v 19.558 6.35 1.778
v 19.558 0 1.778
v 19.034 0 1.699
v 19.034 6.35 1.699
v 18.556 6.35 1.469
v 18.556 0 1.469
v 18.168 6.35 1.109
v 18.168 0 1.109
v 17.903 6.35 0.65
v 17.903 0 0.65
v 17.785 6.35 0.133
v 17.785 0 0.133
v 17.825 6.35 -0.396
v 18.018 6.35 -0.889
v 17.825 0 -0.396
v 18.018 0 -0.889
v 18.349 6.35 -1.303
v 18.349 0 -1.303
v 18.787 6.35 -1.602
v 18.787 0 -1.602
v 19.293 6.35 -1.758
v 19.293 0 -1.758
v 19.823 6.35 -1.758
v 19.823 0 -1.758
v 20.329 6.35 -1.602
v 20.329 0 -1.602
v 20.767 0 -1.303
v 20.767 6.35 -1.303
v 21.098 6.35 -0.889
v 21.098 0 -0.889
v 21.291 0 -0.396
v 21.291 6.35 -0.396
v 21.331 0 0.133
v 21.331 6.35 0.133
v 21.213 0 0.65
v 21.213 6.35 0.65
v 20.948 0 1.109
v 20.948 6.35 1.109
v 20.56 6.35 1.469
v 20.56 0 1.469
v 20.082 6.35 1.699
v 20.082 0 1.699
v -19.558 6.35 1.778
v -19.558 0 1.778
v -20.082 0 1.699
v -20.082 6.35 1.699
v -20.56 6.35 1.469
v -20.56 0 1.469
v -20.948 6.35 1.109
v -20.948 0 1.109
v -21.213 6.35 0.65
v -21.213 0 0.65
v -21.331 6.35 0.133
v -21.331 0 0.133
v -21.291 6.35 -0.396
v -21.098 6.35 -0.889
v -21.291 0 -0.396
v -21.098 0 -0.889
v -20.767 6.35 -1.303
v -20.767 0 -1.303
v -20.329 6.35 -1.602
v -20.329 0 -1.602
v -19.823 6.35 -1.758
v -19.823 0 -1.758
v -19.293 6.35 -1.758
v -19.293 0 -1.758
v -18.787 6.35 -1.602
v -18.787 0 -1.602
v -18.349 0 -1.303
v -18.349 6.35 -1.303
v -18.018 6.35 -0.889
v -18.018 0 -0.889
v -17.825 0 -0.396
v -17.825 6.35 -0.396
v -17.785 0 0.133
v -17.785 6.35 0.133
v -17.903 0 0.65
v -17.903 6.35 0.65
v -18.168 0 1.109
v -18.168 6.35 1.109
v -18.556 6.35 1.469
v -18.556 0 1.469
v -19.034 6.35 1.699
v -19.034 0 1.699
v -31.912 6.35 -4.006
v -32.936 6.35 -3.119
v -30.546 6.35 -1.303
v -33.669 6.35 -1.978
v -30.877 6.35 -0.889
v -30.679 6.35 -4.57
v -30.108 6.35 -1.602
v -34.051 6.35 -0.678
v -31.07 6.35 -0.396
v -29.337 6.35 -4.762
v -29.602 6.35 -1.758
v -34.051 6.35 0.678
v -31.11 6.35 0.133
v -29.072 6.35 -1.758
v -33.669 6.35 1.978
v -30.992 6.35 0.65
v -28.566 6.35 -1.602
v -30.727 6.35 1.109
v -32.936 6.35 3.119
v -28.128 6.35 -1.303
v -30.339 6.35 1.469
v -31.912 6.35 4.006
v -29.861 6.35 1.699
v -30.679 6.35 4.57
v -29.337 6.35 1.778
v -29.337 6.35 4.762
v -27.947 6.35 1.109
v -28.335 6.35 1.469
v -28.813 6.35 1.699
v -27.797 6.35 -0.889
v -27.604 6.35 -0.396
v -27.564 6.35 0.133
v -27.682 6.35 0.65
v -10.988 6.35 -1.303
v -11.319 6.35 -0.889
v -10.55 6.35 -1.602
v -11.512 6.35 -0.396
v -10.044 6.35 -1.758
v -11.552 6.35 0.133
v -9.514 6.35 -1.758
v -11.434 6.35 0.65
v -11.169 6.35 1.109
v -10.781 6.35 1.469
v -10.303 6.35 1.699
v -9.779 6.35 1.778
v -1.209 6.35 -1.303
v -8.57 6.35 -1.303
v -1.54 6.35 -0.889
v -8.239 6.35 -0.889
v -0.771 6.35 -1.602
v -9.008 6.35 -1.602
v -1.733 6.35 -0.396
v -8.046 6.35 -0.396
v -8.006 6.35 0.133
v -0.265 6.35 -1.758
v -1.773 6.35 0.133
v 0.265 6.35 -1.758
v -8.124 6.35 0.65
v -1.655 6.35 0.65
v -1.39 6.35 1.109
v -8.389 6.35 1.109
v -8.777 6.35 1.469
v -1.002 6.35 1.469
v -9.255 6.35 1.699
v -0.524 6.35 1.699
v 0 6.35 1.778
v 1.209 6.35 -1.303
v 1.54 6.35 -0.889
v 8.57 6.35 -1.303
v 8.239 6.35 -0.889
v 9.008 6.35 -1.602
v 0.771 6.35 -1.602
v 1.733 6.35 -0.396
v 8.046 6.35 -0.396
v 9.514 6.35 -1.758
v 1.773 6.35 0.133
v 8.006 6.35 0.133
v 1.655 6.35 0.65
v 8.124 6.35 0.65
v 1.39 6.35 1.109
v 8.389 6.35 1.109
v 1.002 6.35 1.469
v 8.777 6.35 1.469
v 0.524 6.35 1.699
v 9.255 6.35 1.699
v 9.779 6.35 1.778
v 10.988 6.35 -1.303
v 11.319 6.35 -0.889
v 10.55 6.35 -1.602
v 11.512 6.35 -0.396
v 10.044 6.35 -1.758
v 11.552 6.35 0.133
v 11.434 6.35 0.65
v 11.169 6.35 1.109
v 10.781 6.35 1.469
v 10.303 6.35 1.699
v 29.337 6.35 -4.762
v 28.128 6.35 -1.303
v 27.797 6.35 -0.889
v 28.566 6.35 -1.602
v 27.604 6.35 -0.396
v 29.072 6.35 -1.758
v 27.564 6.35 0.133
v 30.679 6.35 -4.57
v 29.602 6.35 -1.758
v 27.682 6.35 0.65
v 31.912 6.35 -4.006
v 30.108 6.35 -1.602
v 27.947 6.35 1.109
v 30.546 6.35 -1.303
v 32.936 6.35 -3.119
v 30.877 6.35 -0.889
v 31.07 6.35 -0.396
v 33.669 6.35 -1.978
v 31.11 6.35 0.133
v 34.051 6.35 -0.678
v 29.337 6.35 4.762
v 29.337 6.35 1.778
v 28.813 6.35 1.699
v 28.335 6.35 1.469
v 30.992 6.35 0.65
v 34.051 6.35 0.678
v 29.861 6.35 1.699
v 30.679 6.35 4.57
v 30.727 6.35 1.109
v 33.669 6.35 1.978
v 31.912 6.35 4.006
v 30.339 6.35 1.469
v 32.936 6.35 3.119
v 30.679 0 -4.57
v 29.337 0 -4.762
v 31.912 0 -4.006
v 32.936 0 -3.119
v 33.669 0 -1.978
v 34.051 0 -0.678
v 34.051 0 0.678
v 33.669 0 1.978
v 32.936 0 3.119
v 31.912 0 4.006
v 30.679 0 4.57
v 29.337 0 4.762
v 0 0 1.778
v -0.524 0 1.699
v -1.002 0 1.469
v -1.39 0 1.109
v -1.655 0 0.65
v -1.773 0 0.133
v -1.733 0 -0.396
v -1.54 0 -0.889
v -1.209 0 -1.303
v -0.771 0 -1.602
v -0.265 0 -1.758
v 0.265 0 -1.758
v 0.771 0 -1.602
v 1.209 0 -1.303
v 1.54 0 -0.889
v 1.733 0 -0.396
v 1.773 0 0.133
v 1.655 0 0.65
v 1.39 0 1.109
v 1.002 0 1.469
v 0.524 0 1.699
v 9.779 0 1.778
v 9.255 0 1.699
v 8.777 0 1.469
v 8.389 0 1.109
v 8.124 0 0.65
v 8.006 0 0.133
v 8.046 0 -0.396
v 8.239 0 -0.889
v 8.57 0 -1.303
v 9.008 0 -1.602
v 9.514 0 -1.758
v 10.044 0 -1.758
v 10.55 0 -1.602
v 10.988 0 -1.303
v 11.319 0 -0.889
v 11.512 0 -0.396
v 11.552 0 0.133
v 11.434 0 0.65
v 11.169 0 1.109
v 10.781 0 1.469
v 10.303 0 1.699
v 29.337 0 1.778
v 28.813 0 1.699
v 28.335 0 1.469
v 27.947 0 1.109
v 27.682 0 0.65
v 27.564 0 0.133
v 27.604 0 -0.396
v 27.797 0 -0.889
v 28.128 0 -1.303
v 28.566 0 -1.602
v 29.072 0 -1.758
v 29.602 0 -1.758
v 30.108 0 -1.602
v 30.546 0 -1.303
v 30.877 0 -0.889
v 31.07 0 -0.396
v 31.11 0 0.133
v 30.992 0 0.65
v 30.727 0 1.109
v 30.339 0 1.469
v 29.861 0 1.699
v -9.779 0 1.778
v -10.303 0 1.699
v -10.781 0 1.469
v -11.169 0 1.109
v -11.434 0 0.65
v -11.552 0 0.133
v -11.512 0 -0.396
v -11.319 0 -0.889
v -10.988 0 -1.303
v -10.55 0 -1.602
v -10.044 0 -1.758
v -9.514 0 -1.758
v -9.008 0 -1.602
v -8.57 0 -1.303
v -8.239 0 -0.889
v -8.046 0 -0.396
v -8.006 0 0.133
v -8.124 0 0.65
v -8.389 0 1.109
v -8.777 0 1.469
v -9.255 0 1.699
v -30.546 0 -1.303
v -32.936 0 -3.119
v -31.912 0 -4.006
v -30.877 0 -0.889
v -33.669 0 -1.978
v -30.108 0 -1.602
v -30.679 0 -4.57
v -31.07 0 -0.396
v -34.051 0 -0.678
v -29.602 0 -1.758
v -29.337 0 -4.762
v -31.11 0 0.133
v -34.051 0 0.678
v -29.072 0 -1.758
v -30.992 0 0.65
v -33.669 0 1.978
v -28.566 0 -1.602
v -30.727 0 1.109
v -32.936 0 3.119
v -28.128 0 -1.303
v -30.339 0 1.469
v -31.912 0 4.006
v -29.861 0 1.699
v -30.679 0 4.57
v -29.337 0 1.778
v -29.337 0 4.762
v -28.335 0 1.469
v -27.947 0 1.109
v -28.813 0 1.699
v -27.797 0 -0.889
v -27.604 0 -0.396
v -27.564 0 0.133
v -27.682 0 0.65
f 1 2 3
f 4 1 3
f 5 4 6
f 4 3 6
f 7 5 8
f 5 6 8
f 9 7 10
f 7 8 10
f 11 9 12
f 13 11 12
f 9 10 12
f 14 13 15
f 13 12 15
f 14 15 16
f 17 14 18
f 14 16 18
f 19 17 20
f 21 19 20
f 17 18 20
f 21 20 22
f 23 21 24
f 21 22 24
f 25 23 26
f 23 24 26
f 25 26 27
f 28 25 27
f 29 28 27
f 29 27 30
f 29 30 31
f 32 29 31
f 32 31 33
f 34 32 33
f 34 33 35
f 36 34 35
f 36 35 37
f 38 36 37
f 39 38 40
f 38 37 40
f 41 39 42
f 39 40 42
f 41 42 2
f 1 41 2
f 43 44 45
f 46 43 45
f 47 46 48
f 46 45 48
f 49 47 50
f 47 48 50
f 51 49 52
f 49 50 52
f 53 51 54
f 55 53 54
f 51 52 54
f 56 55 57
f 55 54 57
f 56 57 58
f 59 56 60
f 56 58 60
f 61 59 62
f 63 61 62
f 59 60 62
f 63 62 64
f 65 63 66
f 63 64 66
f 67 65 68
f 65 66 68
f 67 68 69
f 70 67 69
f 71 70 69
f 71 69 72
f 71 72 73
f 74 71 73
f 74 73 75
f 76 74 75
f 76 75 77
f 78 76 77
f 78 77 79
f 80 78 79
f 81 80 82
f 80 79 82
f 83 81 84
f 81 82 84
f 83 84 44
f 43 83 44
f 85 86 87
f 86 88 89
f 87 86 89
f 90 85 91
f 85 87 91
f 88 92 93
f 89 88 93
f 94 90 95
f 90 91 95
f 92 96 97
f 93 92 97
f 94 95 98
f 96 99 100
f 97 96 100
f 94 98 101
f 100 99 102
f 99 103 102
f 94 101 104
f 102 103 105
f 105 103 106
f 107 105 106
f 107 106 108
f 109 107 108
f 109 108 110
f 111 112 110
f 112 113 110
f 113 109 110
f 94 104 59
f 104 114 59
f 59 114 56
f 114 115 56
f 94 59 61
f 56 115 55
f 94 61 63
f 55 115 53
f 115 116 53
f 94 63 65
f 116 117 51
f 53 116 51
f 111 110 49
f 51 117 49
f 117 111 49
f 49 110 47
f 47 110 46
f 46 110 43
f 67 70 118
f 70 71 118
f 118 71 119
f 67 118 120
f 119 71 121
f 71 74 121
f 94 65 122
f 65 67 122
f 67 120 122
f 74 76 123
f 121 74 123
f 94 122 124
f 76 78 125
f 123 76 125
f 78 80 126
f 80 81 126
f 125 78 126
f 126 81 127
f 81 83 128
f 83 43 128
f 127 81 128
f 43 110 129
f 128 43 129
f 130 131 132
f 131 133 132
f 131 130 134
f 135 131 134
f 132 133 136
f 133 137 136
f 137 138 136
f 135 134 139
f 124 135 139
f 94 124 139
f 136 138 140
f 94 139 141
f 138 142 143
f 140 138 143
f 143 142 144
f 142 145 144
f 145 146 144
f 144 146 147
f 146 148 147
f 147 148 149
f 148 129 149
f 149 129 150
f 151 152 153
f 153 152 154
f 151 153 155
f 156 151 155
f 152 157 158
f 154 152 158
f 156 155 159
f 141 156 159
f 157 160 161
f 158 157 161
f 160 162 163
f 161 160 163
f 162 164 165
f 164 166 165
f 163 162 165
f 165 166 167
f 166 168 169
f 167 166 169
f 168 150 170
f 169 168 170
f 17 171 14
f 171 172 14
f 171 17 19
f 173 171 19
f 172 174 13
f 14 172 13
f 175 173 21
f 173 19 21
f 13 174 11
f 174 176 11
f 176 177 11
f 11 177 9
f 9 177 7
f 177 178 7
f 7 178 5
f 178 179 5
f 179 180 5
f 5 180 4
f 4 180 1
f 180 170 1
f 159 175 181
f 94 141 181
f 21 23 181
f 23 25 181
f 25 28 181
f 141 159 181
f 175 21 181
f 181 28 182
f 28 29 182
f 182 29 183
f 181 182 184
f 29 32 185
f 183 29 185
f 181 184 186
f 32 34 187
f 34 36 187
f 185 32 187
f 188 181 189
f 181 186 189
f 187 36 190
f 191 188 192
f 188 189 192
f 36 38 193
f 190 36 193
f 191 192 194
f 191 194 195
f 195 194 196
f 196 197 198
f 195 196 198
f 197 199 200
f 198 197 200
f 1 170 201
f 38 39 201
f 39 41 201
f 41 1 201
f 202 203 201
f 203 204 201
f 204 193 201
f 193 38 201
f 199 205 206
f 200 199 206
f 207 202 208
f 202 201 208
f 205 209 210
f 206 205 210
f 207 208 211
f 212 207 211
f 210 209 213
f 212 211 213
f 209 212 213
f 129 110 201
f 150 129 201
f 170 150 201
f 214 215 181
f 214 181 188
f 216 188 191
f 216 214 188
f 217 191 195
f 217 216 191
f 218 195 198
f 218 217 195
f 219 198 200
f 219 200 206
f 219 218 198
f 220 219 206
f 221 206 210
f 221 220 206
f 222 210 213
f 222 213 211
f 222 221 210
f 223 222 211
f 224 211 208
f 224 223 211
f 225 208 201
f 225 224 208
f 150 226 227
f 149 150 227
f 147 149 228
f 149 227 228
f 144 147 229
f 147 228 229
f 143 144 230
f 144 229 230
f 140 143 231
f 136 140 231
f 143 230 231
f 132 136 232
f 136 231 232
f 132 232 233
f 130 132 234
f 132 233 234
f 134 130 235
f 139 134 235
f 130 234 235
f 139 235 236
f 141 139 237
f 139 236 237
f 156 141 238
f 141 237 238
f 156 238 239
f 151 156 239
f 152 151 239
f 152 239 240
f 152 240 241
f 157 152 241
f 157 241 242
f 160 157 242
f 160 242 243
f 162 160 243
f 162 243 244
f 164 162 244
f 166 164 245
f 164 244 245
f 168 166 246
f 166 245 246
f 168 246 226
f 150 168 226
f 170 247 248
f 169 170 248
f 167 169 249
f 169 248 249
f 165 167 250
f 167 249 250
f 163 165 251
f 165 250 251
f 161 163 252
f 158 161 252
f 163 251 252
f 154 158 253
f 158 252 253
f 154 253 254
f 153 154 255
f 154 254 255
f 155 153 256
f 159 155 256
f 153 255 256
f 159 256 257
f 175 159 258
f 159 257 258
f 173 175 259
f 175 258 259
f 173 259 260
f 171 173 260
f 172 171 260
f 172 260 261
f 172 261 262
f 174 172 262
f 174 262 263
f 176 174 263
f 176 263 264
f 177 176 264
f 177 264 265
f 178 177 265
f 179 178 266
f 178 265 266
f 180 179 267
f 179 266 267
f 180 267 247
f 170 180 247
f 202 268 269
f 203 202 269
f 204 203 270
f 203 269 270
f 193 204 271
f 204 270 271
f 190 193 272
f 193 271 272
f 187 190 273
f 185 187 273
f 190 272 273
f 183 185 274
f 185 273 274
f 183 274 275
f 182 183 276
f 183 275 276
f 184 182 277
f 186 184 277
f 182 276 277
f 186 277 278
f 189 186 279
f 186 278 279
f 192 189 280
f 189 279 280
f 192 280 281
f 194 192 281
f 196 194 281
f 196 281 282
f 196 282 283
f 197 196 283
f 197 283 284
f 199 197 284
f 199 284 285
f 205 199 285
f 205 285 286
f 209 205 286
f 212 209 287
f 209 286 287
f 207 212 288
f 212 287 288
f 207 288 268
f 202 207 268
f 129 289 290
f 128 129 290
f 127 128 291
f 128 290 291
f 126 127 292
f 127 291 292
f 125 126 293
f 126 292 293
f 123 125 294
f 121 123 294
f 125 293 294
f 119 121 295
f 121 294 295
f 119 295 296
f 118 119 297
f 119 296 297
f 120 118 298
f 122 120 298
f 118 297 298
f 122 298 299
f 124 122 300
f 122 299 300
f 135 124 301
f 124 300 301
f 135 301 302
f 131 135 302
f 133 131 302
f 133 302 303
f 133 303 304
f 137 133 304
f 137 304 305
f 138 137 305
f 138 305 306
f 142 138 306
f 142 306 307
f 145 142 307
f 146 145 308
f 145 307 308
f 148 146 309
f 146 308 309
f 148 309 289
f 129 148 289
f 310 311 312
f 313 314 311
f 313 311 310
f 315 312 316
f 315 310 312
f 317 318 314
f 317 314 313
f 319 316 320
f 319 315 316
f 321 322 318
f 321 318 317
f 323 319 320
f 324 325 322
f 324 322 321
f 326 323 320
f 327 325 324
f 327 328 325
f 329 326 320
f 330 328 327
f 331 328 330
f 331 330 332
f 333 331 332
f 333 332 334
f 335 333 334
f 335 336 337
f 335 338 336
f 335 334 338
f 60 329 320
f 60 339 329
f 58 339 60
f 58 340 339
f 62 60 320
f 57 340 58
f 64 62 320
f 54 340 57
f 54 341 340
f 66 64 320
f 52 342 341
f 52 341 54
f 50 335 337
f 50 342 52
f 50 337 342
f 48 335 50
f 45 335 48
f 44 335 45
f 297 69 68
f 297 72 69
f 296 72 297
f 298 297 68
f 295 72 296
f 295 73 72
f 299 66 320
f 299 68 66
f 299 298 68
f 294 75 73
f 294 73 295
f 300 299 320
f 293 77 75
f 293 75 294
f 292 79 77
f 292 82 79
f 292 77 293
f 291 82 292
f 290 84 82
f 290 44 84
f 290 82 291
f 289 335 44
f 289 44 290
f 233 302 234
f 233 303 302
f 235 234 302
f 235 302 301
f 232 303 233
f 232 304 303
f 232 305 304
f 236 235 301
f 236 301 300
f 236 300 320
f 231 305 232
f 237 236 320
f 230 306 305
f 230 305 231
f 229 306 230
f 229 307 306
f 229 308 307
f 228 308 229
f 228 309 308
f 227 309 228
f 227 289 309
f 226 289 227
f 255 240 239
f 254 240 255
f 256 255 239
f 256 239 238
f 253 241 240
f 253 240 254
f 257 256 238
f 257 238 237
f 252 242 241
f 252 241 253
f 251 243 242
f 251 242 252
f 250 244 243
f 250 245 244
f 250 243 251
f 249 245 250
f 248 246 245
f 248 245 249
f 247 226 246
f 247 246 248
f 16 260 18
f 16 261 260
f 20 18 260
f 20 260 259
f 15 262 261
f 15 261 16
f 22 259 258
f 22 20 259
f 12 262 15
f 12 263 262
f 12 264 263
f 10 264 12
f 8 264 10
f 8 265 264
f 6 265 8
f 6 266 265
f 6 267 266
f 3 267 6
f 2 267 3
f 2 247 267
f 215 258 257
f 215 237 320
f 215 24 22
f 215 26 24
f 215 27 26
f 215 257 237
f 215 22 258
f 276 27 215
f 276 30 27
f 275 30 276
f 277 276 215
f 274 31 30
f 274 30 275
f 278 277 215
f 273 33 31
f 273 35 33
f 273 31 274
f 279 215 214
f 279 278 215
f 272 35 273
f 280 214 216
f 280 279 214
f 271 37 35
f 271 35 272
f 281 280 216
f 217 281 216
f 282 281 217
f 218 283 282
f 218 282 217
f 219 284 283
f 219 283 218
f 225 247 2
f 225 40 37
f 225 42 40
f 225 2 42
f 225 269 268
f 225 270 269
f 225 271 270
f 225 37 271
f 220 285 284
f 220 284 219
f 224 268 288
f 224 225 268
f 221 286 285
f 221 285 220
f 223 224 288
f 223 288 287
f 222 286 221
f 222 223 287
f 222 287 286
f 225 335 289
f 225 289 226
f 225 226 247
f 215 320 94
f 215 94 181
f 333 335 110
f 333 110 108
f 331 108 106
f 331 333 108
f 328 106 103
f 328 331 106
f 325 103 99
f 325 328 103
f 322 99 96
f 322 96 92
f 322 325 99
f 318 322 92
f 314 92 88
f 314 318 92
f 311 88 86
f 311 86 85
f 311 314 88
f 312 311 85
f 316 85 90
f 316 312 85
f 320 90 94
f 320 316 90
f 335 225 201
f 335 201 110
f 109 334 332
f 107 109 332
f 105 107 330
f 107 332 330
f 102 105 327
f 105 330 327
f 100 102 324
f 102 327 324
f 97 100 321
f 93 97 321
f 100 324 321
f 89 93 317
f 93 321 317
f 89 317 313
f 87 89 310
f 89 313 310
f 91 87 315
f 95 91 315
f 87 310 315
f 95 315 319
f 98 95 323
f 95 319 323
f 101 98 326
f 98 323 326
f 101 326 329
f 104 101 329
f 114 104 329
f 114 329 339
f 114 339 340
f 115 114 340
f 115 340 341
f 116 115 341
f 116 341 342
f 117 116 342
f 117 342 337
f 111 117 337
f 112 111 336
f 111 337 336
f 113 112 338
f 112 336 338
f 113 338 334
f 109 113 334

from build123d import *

# Parameters (mm, degrees)
SKETCH1_R           = 1.778
BOSS_EXTRUDE1_DEPTH = 6.35


with BuildPart() as part:
    # Sketch1 → Boss-Extrude1 (new body)
    with BuildSketch(Plane.XZ):
        with BuildLine():
            Line((-29.337, -4.7625), (29.337, -4.7625))
            ThreePointArc((29.337, -4.7625), (34.0995, 0), (29.337, 4.7625))
            Line((29.337, 4.7625), (-29.337, 4.7625))
            ThreePointArc((-29.337, 4.7625), (-34.0995, 0), (-29.337, -4.7625))
        make_face()
        with Locations(Location((29.337, 0, 0), (0, 0, 90))):
            Circle(SKETCH1_R, mode=Mode.SUBTRACT)
        with Locations(Location((19.558, 0, 0), (0, 0, 90))):
            Circle(SKETCH1_R, mode=Mode.SUBTRACT)
        with Locations(Location((9.779, 0, 0), (0, 0, 90))):
            Circle(SKETCH1_R, mode=Mode.SUBTRACT)
        with Locations(Location((0, 0, 0), (0, 0, 90))):
            Circle(SKETCH1_R, mode=Mode.SUBTRACT)
        with Locations(Location((-9.779, 0, 0), (0, 0, 90))):
            Circle(SKETCH1_R, mode=Mode.SUBTRACT)
        with Locations(Location((-19.558, 0, 0), (0, 0, 90))):
            Circle(SKETCH1_R, mode=Mode.SUBTRACT)
        with Locations(Location((-29.337, 0, 0), (0, 0, 90))):
            Circle(SKETCH1_R, mode=Mode.SUBTRACT)
    extrude(amount=-BOSS_EXTRUDE1_DEPTH)


solid = part.part
